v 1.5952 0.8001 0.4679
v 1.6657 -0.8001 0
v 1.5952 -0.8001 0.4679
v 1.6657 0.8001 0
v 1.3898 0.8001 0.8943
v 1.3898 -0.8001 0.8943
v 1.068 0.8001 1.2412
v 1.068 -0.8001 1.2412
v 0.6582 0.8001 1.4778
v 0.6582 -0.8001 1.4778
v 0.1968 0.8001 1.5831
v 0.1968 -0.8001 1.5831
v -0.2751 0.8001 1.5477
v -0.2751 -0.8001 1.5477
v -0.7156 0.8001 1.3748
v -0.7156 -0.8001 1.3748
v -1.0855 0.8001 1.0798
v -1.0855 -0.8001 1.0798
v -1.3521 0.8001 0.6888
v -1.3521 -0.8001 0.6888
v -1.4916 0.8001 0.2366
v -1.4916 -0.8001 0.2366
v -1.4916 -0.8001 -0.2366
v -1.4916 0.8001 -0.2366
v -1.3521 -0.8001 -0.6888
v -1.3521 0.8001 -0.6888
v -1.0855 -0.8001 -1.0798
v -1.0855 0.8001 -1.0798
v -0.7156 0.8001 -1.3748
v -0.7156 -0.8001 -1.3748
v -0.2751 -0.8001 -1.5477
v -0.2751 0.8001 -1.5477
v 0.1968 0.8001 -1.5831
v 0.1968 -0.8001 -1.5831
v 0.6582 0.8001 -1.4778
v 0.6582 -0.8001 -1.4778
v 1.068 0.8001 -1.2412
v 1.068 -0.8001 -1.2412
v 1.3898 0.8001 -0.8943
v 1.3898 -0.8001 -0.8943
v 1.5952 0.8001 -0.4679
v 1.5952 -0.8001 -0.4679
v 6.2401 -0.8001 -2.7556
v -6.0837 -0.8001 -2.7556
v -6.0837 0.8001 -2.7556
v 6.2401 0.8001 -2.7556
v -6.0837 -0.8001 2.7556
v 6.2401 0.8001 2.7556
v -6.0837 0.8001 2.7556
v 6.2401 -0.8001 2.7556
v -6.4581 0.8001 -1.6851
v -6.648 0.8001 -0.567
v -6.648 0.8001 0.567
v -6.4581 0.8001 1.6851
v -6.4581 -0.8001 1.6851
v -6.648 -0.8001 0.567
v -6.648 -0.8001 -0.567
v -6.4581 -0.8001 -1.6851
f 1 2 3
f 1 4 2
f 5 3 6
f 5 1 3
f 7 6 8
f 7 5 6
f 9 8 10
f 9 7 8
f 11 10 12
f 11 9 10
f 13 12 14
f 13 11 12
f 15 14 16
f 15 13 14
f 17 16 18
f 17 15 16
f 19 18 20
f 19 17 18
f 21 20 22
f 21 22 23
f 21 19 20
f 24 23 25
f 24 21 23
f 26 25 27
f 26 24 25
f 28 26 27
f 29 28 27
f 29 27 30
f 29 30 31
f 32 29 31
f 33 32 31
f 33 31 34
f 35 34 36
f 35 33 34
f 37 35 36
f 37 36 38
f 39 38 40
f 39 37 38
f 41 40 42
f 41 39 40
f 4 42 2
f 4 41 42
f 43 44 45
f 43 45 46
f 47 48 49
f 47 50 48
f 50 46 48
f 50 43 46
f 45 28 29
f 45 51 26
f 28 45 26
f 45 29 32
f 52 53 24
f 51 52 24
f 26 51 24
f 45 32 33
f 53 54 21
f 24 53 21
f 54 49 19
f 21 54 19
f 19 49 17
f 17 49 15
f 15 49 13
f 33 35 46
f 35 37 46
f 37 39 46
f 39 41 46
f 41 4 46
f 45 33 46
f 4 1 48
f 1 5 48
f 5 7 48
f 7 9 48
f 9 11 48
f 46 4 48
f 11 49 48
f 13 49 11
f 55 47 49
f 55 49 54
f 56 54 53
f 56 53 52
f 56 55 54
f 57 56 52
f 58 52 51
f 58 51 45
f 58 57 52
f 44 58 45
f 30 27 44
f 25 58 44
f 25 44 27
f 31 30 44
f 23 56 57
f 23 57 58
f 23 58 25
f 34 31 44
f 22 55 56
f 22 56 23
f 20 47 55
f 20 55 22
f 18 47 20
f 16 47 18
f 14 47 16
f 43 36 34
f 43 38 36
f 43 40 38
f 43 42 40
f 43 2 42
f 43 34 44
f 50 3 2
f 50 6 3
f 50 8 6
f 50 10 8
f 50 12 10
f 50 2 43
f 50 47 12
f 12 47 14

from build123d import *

# Parameters (mm, degrees)
F0_R     = 1.5875
F1_DEPTH = 0.8001


with BuildPart() as f1:
    # F0 (on Front) → F1 (new body, symmetric)
    with BuildSketch(Plane.XZ):
        with BuildLine():
            Line((6.240089, 2.755591), (-6.083732, 2.755591))
            ThreePointArc((-6.083732, 2.755591), (-6.671816, 0), (-6.083732, -2.755591))
            Line((-6.083732, -2.755591), (6.240089, -2.755591))
            Line((6.240089, -2.755591), (6.240089, 2.755591))
        make_face()
        with Locations((0.078179, 0)):
            Circle(F0_R, mode=Mode.SUBTRACT)
    extrude(amount=F1_DEPTH, both=True)


solid = f1.part
